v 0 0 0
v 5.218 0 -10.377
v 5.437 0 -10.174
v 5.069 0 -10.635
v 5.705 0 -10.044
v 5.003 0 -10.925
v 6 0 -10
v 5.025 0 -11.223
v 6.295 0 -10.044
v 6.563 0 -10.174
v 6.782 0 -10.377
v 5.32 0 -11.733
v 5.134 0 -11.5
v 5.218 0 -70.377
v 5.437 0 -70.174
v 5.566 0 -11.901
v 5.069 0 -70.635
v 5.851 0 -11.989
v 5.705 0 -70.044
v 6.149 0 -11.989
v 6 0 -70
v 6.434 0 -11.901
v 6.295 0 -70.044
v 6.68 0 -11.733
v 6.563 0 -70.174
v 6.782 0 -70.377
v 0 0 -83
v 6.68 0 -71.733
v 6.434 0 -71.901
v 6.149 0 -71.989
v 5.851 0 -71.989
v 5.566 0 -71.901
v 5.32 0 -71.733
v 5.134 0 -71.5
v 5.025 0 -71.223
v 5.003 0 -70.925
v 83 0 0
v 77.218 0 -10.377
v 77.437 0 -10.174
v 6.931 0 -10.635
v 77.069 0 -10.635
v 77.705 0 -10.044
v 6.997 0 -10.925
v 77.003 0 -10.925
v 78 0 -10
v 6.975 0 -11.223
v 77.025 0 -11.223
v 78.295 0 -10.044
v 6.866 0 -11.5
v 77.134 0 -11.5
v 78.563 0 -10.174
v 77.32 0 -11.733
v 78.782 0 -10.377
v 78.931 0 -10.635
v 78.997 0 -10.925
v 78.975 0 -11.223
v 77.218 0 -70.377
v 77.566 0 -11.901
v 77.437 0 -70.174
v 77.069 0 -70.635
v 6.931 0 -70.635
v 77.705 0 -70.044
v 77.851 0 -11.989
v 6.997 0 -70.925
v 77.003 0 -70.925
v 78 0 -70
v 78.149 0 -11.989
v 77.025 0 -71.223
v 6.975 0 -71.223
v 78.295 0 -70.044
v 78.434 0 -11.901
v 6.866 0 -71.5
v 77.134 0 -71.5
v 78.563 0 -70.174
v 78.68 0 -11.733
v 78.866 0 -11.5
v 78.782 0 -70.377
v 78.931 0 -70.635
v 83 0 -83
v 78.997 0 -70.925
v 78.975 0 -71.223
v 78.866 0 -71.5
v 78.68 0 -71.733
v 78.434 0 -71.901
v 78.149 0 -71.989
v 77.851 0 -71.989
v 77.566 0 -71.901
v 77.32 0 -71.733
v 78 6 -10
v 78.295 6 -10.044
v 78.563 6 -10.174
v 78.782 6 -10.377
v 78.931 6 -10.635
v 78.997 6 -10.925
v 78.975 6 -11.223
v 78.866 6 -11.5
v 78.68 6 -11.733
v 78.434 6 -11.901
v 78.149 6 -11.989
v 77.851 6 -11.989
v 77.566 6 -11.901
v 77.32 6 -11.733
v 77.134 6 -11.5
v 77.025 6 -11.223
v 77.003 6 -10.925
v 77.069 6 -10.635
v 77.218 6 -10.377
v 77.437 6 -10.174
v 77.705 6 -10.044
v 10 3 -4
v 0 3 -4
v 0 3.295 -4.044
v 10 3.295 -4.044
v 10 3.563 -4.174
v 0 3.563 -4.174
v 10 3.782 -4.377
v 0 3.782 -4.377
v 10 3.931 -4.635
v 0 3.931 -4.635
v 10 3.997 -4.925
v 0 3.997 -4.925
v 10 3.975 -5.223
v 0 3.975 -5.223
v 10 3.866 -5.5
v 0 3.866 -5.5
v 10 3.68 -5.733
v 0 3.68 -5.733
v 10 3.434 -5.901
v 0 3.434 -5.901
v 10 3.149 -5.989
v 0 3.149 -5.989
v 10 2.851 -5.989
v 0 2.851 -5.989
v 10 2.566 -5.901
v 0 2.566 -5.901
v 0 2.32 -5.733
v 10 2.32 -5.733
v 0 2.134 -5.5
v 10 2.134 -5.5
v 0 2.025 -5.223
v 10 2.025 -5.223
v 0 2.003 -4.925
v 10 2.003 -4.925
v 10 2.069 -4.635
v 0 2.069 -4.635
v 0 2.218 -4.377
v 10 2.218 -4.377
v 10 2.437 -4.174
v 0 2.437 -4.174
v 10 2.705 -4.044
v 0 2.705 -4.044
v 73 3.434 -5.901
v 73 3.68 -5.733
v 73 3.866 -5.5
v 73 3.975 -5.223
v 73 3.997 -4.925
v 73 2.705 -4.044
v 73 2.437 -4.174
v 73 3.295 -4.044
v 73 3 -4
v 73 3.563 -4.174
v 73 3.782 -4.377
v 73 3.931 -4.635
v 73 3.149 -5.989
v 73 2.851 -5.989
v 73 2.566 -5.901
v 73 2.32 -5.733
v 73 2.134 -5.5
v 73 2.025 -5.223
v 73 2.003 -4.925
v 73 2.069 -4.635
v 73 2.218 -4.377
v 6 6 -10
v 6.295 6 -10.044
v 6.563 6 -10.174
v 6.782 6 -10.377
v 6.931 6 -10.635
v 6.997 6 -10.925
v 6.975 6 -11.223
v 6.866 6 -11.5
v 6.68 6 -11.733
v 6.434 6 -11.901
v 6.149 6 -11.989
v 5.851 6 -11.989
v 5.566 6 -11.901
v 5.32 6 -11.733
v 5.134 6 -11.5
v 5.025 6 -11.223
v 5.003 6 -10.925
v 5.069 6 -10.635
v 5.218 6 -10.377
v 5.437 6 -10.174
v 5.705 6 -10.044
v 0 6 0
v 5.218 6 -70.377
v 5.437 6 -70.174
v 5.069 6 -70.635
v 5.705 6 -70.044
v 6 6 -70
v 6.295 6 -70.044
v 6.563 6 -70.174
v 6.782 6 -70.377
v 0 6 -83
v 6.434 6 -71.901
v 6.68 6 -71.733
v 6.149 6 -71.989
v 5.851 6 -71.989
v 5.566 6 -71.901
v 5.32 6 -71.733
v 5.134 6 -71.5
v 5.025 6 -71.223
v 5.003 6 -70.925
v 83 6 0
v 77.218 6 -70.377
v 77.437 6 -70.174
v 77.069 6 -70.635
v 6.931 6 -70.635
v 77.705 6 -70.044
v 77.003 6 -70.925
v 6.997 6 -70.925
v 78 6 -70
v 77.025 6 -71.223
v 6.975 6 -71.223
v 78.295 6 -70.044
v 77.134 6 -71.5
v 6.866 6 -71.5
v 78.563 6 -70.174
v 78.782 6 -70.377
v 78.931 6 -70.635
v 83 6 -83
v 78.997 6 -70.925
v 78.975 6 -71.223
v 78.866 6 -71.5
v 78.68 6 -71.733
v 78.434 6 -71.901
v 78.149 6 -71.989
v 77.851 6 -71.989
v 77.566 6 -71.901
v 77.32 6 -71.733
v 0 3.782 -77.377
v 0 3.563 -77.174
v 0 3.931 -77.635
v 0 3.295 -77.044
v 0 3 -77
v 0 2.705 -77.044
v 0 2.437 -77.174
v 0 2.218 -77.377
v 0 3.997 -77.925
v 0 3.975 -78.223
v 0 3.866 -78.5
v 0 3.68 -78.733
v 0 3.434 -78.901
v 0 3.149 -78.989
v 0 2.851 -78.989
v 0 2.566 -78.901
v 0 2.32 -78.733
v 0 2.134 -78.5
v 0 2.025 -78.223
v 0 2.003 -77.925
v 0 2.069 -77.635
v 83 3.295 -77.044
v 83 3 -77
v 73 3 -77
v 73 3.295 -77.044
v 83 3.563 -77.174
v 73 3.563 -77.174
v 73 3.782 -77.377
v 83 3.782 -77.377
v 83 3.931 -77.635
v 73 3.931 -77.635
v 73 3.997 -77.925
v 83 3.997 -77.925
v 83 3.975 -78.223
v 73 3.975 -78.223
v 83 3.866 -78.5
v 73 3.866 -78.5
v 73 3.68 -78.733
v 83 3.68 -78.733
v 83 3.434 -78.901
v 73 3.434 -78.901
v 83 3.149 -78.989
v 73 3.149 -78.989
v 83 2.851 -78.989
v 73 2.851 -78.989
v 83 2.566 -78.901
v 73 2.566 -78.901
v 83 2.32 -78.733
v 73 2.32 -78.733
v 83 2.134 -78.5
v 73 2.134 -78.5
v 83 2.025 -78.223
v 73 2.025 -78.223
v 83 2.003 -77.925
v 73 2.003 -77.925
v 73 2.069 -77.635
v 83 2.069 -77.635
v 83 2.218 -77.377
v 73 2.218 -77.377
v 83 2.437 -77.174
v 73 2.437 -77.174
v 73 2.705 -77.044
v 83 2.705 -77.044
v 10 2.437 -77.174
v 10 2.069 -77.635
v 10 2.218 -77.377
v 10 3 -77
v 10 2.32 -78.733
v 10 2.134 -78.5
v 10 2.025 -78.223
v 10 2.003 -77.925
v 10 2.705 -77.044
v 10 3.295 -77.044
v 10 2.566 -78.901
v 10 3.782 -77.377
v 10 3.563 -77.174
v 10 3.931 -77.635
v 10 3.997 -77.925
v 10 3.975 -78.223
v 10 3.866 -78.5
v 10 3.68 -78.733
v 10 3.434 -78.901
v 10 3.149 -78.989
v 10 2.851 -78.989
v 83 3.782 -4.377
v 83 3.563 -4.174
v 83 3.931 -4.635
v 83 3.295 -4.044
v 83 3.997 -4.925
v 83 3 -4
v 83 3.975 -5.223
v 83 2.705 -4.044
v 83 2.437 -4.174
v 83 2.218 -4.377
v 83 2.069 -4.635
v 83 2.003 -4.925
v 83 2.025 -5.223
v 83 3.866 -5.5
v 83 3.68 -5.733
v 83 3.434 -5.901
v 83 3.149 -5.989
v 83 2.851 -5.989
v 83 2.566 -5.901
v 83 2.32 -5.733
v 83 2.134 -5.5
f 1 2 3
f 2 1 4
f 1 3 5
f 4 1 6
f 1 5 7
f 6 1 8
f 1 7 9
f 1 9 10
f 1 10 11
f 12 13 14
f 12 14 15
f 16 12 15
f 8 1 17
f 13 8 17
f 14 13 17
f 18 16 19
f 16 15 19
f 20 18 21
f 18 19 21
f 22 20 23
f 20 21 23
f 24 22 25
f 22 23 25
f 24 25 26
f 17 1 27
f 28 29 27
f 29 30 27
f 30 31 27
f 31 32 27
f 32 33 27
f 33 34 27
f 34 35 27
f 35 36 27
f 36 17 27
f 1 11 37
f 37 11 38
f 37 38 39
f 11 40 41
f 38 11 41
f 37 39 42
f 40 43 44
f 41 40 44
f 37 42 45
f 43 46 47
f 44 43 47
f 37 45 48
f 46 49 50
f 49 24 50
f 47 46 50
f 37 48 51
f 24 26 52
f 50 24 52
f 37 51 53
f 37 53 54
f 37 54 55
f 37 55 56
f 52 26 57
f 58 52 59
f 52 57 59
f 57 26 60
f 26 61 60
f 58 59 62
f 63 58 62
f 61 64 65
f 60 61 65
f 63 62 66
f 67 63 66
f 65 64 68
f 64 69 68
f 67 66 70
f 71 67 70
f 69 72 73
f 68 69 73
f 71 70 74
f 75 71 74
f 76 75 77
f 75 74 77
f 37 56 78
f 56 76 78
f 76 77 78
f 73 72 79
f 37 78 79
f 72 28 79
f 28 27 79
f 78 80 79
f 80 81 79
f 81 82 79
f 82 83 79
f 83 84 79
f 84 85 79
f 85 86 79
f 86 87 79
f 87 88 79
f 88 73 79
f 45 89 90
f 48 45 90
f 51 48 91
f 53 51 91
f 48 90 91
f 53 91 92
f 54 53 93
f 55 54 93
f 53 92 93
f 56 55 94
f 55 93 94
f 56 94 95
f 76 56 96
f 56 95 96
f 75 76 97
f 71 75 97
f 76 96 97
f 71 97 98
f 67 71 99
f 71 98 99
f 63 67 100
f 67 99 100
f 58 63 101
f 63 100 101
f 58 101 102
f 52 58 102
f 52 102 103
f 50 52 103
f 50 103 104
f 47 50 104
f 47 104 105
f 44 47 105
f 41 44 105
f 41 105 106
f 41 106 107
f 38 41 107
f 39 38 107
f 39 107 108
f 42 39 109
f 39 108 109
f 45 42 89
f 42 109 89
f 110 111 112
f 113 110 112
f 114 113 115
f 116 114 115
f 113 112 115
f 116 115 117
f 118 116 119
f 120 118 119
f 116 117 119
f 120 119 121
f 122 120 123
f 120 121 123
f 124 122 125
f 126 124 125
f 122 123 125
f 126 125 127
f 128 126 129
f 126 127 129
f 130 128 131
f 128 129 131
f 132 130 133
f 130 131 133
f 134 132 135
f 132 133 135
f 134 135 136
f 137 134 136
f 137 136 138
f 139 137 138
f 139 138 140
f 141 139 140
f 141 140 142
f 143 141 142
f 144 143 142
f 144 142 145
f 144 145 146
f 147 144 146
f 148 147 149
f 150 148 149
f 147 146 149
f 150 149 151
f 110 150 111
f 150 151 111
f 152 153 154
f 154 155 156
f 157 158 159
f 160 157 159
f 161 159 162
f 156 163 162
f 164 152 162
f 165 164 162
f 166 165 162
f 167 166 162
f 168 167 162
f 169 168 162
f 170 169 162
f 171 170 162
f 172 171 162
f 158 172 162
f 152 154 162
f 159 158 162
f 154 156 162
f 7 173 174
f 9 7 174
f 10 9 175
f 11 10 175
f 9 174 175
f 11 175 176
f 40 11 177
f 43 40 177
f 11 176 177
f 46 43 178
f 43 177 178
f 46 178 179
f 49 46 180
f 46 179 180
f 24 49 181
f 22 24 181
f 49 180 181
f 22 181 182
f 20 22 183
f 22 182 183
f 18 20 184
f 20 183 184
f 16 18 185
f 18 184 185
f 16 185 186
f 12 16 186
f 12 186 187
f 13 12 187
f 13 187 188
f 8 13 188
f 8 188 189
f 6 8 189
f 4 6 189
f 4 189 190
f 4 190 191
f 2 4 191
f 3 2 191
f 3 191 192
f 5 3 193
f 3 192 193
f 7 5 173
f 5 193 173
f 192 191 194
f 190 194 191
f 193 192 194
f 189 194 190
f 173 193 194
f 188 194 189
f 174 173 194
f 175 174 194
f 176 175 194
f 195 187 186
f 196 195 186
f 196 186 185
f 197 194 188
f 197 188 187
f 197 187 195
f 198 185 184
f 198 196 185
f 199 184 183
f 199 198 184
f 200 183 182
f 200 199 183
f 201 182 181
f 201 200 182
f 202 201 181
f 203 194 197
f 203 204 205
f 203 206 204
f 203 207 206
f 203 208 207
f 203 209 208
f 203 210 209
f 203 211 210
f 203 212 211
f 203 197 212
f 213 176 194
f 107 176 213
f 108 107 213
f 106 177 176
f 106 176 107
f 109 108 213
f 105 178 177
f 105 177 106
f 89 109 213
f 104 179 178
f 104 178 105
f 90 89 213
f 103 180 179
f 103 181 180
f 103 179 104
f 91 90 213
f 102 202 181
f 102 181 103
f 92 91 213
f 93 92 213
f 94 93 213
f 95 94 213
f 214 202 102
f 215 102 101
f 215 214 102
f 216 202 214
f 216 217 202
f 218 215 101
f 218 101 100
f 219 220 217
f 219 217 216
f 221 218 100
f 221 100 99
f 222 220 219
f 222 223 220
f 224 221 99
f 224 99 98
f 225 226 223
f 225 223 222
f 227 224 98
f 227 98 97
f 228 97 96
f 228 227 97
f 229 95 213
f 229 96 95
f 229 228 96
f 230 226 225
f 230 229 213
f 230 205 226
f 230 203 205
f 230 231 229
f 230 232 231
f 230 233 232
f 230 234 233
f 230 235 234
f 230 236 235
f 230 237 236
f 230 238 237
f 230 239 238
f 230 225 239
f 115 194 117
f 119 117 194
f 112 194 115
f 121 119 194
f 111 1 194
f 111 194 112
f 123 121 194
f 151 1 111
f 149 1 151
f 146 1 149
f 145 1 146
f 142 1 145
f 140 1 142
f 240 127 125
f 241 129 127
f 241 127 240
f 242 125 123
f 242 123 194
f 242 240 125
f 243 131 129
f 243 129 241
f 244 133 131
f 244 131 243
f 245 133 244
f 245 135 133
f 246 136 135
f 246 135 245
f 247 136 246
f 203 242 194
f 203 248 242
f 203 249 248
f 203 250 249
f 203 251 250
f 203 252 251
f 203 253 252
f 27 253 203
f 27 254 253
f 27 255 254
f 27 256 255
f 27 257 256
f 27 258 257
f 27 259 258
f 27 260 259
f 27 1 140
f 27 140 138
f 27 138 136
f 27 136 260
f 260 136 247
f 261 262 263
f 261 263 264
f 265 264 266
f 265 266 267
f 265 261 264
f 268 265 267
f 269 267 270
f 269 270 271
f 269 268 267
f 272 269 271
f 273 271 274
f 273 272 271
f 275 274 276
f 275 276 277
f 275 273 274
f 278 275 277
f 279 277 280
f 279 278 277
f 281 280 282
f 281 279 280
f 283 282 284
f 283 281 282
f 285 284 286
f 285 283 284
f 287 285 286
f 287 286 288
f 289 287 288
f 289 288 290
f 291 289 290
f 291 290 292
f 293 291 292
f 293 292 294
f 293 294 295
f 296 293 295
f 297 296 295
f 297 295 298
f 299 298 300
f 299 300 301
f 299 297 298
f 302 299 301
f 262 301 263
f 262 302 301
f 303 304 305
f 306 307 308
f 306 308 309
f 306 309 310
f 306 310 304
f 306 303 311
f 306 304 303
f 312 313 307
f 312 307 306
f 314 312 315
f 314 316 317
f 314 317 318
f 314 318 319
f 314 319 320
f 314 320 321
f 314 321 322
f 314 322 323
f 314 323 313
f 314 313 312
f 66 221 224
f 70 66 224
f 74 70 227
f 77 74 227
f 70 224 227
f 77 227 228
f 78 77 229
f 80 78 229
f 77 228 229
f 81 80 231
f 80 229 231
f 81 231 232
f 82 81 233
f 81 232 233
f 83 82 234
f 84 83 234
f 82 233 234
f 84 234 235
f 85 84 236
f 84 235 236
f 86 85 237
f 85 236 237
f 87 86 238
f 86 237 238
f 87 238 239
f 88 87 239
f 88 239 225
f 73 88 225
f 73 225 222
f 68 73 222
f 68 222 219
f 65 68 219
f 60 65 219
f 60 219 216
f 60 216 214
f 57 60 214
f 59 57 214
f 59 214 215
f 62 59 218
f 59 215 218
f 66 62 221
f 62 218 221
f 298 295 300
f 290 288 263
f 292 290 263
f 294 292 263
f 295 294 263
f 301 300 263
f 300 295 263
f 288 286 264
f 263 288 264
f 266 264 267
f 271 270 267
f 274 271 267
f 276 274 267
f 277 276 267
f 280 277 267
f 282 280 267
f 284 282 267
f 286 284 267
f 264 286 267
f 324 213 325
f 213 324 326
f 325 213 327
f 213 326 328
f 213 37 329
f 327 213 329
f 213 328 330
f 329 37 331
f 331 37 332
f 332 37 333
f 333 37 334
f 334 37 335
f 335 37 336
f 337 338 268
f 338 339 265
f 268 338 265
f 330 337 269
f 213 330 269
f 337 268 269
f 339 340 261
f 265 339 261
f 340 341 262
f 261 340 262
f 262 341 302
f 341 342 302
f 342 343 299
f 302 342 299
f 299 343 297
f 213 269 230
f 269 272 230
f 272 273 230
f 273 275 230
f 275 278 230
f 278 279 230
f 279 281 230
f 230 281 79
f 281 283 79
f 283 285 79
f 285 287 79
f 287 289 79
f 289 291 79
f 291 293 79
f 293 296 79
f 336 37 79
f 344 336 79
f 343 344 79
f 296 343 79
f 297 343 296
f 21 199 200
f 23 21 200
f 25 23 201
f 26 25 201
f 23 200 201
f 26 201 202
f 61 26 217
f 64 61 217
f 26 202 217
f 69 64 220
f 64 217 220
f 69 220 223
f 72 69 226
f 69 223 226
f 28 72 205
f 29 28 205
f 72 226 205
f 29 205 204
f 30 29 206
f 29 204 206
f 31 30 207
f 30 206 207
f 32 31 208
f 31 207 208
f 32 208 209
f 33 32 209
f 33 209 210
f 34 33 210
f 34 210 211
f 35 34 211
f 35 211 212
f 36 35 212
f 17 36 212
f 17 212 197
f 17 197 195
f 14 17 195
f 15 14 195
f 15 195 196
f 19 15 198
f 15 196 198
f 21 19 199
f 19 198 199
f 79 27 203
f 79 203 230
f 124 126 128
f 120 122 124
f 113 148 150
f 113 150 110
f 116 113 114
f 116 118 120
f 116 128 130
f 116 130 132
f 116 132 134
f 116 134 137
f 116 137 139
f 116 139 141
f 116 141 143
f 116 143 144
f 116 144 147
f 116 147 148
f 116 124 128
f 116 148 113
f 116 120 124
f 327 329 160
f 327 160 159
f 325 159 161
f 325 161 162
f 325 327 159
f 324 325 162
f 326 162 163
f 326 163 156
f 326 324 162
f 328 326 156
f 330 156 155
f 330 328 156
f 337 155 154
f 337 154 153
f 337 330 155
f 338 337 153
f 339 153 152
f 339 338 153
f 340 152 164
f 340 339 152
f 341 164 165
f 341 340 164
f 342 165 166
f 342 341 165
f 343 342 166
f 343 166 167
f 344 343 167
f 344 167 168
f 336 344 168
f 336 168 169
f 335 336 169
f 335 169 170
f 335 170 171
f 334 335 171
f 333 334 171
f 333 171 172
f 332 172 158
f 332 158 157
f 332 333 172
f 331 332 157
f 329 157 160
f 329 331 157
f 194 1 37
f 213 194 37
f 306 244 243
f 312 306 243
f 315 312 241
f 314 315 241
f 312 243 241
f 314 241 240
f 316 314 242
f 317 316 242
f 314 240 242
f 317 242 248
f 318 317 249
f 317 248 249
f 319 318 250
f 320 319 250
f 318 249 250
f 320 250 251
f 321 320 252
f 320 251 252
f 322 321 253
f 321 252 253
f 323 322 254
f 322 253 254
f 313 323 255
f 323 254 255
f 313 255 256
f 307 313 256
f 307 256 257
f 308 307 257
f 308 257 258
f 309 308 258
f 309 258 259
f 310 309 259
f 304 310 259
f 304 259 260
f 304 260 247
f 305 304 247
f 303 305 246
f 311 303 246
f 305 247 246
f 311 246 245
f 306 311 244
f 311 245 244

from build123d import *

# Parameters (mm, degrees)
SKETCH1_W            = 83
SKETCH1_H            = 83
BOSS_EXTRUDE1_DEPTH  = 6
SKETCH2_R            = 1
CUT_EXTRUDE1_DEPTH   = 6
LPATTERN1_COUNT      = 2
LPATTERN1_PITCH      = 72
LPATTERN1_COUNT_DIR2 = 2
LPATTERN1_PITCH_DIR2 = 60
SKETCH3_R            = 1
CUT_EXTRUDE2_DEPTH   = 10


with BuildPart() as part:
    # Sketch1 → Boss-Extrude1 (new body)
    with BuildSketch(Plane(origin=(0, 0, 0), x_dir=(1, 0, 0), z_dir=(0, 1, 0))):
        with Locations((41.5, 41.5)):
            Rectangle(SKETCH1_W, SKETCH1_H)
    extrude(amount=BOSS_EXTRUDE1_DEPTH)

    # Sketch2 → Cut-Extrude1 (cut)
    with BuildSketch(Plane(origin=(0, 6, 0), x_dir=(1, 0, 0), z_dir=(0, 1, 0))):
        with Locations(Location((6, 71, 0), (0, 0, 270))):
            Circle(SKETCH2_R)
    cut_extrude1 = extrude(amount=-CUT_EXTRUDE1_DEPTH, mode=Mode.SUBTRACT)

    # LPattern1: Cut-Extrude1 2 × 2
    with Locations(*[(i * LPATTERN1_PITCH, 0, j * LPATTERN1_PITCH_DIR2) for i in range(LPATTERN1_COUNT) for j in range(LPATTERN1_COUNT_DIR2) if (i, j) != (0, 0)]):
        add(cut_extrude1, mode=Mode.SUBTRACT)

    # Sketch3 → Cut-Extrude2 (cut)
    with BuildSketch(Plane.ZY):
        with Locations((-78, 3)):
            Circle(SKETCH3_R)
        with Locations((-5, 3)):
            Circle(SKETCH3_R)
    cut_extrude2 = extrude(amount=-CUT_EXTRUDE2_DEPTH, mode=Mode.SUBTRACT)

    # Mirror1: Cut-Extrude2 across plane
    add(cut_extrude2.mirror(Plane.ZY.offset(-41.5)), mode=Mode.SUBTRACT)


solid = part.part
